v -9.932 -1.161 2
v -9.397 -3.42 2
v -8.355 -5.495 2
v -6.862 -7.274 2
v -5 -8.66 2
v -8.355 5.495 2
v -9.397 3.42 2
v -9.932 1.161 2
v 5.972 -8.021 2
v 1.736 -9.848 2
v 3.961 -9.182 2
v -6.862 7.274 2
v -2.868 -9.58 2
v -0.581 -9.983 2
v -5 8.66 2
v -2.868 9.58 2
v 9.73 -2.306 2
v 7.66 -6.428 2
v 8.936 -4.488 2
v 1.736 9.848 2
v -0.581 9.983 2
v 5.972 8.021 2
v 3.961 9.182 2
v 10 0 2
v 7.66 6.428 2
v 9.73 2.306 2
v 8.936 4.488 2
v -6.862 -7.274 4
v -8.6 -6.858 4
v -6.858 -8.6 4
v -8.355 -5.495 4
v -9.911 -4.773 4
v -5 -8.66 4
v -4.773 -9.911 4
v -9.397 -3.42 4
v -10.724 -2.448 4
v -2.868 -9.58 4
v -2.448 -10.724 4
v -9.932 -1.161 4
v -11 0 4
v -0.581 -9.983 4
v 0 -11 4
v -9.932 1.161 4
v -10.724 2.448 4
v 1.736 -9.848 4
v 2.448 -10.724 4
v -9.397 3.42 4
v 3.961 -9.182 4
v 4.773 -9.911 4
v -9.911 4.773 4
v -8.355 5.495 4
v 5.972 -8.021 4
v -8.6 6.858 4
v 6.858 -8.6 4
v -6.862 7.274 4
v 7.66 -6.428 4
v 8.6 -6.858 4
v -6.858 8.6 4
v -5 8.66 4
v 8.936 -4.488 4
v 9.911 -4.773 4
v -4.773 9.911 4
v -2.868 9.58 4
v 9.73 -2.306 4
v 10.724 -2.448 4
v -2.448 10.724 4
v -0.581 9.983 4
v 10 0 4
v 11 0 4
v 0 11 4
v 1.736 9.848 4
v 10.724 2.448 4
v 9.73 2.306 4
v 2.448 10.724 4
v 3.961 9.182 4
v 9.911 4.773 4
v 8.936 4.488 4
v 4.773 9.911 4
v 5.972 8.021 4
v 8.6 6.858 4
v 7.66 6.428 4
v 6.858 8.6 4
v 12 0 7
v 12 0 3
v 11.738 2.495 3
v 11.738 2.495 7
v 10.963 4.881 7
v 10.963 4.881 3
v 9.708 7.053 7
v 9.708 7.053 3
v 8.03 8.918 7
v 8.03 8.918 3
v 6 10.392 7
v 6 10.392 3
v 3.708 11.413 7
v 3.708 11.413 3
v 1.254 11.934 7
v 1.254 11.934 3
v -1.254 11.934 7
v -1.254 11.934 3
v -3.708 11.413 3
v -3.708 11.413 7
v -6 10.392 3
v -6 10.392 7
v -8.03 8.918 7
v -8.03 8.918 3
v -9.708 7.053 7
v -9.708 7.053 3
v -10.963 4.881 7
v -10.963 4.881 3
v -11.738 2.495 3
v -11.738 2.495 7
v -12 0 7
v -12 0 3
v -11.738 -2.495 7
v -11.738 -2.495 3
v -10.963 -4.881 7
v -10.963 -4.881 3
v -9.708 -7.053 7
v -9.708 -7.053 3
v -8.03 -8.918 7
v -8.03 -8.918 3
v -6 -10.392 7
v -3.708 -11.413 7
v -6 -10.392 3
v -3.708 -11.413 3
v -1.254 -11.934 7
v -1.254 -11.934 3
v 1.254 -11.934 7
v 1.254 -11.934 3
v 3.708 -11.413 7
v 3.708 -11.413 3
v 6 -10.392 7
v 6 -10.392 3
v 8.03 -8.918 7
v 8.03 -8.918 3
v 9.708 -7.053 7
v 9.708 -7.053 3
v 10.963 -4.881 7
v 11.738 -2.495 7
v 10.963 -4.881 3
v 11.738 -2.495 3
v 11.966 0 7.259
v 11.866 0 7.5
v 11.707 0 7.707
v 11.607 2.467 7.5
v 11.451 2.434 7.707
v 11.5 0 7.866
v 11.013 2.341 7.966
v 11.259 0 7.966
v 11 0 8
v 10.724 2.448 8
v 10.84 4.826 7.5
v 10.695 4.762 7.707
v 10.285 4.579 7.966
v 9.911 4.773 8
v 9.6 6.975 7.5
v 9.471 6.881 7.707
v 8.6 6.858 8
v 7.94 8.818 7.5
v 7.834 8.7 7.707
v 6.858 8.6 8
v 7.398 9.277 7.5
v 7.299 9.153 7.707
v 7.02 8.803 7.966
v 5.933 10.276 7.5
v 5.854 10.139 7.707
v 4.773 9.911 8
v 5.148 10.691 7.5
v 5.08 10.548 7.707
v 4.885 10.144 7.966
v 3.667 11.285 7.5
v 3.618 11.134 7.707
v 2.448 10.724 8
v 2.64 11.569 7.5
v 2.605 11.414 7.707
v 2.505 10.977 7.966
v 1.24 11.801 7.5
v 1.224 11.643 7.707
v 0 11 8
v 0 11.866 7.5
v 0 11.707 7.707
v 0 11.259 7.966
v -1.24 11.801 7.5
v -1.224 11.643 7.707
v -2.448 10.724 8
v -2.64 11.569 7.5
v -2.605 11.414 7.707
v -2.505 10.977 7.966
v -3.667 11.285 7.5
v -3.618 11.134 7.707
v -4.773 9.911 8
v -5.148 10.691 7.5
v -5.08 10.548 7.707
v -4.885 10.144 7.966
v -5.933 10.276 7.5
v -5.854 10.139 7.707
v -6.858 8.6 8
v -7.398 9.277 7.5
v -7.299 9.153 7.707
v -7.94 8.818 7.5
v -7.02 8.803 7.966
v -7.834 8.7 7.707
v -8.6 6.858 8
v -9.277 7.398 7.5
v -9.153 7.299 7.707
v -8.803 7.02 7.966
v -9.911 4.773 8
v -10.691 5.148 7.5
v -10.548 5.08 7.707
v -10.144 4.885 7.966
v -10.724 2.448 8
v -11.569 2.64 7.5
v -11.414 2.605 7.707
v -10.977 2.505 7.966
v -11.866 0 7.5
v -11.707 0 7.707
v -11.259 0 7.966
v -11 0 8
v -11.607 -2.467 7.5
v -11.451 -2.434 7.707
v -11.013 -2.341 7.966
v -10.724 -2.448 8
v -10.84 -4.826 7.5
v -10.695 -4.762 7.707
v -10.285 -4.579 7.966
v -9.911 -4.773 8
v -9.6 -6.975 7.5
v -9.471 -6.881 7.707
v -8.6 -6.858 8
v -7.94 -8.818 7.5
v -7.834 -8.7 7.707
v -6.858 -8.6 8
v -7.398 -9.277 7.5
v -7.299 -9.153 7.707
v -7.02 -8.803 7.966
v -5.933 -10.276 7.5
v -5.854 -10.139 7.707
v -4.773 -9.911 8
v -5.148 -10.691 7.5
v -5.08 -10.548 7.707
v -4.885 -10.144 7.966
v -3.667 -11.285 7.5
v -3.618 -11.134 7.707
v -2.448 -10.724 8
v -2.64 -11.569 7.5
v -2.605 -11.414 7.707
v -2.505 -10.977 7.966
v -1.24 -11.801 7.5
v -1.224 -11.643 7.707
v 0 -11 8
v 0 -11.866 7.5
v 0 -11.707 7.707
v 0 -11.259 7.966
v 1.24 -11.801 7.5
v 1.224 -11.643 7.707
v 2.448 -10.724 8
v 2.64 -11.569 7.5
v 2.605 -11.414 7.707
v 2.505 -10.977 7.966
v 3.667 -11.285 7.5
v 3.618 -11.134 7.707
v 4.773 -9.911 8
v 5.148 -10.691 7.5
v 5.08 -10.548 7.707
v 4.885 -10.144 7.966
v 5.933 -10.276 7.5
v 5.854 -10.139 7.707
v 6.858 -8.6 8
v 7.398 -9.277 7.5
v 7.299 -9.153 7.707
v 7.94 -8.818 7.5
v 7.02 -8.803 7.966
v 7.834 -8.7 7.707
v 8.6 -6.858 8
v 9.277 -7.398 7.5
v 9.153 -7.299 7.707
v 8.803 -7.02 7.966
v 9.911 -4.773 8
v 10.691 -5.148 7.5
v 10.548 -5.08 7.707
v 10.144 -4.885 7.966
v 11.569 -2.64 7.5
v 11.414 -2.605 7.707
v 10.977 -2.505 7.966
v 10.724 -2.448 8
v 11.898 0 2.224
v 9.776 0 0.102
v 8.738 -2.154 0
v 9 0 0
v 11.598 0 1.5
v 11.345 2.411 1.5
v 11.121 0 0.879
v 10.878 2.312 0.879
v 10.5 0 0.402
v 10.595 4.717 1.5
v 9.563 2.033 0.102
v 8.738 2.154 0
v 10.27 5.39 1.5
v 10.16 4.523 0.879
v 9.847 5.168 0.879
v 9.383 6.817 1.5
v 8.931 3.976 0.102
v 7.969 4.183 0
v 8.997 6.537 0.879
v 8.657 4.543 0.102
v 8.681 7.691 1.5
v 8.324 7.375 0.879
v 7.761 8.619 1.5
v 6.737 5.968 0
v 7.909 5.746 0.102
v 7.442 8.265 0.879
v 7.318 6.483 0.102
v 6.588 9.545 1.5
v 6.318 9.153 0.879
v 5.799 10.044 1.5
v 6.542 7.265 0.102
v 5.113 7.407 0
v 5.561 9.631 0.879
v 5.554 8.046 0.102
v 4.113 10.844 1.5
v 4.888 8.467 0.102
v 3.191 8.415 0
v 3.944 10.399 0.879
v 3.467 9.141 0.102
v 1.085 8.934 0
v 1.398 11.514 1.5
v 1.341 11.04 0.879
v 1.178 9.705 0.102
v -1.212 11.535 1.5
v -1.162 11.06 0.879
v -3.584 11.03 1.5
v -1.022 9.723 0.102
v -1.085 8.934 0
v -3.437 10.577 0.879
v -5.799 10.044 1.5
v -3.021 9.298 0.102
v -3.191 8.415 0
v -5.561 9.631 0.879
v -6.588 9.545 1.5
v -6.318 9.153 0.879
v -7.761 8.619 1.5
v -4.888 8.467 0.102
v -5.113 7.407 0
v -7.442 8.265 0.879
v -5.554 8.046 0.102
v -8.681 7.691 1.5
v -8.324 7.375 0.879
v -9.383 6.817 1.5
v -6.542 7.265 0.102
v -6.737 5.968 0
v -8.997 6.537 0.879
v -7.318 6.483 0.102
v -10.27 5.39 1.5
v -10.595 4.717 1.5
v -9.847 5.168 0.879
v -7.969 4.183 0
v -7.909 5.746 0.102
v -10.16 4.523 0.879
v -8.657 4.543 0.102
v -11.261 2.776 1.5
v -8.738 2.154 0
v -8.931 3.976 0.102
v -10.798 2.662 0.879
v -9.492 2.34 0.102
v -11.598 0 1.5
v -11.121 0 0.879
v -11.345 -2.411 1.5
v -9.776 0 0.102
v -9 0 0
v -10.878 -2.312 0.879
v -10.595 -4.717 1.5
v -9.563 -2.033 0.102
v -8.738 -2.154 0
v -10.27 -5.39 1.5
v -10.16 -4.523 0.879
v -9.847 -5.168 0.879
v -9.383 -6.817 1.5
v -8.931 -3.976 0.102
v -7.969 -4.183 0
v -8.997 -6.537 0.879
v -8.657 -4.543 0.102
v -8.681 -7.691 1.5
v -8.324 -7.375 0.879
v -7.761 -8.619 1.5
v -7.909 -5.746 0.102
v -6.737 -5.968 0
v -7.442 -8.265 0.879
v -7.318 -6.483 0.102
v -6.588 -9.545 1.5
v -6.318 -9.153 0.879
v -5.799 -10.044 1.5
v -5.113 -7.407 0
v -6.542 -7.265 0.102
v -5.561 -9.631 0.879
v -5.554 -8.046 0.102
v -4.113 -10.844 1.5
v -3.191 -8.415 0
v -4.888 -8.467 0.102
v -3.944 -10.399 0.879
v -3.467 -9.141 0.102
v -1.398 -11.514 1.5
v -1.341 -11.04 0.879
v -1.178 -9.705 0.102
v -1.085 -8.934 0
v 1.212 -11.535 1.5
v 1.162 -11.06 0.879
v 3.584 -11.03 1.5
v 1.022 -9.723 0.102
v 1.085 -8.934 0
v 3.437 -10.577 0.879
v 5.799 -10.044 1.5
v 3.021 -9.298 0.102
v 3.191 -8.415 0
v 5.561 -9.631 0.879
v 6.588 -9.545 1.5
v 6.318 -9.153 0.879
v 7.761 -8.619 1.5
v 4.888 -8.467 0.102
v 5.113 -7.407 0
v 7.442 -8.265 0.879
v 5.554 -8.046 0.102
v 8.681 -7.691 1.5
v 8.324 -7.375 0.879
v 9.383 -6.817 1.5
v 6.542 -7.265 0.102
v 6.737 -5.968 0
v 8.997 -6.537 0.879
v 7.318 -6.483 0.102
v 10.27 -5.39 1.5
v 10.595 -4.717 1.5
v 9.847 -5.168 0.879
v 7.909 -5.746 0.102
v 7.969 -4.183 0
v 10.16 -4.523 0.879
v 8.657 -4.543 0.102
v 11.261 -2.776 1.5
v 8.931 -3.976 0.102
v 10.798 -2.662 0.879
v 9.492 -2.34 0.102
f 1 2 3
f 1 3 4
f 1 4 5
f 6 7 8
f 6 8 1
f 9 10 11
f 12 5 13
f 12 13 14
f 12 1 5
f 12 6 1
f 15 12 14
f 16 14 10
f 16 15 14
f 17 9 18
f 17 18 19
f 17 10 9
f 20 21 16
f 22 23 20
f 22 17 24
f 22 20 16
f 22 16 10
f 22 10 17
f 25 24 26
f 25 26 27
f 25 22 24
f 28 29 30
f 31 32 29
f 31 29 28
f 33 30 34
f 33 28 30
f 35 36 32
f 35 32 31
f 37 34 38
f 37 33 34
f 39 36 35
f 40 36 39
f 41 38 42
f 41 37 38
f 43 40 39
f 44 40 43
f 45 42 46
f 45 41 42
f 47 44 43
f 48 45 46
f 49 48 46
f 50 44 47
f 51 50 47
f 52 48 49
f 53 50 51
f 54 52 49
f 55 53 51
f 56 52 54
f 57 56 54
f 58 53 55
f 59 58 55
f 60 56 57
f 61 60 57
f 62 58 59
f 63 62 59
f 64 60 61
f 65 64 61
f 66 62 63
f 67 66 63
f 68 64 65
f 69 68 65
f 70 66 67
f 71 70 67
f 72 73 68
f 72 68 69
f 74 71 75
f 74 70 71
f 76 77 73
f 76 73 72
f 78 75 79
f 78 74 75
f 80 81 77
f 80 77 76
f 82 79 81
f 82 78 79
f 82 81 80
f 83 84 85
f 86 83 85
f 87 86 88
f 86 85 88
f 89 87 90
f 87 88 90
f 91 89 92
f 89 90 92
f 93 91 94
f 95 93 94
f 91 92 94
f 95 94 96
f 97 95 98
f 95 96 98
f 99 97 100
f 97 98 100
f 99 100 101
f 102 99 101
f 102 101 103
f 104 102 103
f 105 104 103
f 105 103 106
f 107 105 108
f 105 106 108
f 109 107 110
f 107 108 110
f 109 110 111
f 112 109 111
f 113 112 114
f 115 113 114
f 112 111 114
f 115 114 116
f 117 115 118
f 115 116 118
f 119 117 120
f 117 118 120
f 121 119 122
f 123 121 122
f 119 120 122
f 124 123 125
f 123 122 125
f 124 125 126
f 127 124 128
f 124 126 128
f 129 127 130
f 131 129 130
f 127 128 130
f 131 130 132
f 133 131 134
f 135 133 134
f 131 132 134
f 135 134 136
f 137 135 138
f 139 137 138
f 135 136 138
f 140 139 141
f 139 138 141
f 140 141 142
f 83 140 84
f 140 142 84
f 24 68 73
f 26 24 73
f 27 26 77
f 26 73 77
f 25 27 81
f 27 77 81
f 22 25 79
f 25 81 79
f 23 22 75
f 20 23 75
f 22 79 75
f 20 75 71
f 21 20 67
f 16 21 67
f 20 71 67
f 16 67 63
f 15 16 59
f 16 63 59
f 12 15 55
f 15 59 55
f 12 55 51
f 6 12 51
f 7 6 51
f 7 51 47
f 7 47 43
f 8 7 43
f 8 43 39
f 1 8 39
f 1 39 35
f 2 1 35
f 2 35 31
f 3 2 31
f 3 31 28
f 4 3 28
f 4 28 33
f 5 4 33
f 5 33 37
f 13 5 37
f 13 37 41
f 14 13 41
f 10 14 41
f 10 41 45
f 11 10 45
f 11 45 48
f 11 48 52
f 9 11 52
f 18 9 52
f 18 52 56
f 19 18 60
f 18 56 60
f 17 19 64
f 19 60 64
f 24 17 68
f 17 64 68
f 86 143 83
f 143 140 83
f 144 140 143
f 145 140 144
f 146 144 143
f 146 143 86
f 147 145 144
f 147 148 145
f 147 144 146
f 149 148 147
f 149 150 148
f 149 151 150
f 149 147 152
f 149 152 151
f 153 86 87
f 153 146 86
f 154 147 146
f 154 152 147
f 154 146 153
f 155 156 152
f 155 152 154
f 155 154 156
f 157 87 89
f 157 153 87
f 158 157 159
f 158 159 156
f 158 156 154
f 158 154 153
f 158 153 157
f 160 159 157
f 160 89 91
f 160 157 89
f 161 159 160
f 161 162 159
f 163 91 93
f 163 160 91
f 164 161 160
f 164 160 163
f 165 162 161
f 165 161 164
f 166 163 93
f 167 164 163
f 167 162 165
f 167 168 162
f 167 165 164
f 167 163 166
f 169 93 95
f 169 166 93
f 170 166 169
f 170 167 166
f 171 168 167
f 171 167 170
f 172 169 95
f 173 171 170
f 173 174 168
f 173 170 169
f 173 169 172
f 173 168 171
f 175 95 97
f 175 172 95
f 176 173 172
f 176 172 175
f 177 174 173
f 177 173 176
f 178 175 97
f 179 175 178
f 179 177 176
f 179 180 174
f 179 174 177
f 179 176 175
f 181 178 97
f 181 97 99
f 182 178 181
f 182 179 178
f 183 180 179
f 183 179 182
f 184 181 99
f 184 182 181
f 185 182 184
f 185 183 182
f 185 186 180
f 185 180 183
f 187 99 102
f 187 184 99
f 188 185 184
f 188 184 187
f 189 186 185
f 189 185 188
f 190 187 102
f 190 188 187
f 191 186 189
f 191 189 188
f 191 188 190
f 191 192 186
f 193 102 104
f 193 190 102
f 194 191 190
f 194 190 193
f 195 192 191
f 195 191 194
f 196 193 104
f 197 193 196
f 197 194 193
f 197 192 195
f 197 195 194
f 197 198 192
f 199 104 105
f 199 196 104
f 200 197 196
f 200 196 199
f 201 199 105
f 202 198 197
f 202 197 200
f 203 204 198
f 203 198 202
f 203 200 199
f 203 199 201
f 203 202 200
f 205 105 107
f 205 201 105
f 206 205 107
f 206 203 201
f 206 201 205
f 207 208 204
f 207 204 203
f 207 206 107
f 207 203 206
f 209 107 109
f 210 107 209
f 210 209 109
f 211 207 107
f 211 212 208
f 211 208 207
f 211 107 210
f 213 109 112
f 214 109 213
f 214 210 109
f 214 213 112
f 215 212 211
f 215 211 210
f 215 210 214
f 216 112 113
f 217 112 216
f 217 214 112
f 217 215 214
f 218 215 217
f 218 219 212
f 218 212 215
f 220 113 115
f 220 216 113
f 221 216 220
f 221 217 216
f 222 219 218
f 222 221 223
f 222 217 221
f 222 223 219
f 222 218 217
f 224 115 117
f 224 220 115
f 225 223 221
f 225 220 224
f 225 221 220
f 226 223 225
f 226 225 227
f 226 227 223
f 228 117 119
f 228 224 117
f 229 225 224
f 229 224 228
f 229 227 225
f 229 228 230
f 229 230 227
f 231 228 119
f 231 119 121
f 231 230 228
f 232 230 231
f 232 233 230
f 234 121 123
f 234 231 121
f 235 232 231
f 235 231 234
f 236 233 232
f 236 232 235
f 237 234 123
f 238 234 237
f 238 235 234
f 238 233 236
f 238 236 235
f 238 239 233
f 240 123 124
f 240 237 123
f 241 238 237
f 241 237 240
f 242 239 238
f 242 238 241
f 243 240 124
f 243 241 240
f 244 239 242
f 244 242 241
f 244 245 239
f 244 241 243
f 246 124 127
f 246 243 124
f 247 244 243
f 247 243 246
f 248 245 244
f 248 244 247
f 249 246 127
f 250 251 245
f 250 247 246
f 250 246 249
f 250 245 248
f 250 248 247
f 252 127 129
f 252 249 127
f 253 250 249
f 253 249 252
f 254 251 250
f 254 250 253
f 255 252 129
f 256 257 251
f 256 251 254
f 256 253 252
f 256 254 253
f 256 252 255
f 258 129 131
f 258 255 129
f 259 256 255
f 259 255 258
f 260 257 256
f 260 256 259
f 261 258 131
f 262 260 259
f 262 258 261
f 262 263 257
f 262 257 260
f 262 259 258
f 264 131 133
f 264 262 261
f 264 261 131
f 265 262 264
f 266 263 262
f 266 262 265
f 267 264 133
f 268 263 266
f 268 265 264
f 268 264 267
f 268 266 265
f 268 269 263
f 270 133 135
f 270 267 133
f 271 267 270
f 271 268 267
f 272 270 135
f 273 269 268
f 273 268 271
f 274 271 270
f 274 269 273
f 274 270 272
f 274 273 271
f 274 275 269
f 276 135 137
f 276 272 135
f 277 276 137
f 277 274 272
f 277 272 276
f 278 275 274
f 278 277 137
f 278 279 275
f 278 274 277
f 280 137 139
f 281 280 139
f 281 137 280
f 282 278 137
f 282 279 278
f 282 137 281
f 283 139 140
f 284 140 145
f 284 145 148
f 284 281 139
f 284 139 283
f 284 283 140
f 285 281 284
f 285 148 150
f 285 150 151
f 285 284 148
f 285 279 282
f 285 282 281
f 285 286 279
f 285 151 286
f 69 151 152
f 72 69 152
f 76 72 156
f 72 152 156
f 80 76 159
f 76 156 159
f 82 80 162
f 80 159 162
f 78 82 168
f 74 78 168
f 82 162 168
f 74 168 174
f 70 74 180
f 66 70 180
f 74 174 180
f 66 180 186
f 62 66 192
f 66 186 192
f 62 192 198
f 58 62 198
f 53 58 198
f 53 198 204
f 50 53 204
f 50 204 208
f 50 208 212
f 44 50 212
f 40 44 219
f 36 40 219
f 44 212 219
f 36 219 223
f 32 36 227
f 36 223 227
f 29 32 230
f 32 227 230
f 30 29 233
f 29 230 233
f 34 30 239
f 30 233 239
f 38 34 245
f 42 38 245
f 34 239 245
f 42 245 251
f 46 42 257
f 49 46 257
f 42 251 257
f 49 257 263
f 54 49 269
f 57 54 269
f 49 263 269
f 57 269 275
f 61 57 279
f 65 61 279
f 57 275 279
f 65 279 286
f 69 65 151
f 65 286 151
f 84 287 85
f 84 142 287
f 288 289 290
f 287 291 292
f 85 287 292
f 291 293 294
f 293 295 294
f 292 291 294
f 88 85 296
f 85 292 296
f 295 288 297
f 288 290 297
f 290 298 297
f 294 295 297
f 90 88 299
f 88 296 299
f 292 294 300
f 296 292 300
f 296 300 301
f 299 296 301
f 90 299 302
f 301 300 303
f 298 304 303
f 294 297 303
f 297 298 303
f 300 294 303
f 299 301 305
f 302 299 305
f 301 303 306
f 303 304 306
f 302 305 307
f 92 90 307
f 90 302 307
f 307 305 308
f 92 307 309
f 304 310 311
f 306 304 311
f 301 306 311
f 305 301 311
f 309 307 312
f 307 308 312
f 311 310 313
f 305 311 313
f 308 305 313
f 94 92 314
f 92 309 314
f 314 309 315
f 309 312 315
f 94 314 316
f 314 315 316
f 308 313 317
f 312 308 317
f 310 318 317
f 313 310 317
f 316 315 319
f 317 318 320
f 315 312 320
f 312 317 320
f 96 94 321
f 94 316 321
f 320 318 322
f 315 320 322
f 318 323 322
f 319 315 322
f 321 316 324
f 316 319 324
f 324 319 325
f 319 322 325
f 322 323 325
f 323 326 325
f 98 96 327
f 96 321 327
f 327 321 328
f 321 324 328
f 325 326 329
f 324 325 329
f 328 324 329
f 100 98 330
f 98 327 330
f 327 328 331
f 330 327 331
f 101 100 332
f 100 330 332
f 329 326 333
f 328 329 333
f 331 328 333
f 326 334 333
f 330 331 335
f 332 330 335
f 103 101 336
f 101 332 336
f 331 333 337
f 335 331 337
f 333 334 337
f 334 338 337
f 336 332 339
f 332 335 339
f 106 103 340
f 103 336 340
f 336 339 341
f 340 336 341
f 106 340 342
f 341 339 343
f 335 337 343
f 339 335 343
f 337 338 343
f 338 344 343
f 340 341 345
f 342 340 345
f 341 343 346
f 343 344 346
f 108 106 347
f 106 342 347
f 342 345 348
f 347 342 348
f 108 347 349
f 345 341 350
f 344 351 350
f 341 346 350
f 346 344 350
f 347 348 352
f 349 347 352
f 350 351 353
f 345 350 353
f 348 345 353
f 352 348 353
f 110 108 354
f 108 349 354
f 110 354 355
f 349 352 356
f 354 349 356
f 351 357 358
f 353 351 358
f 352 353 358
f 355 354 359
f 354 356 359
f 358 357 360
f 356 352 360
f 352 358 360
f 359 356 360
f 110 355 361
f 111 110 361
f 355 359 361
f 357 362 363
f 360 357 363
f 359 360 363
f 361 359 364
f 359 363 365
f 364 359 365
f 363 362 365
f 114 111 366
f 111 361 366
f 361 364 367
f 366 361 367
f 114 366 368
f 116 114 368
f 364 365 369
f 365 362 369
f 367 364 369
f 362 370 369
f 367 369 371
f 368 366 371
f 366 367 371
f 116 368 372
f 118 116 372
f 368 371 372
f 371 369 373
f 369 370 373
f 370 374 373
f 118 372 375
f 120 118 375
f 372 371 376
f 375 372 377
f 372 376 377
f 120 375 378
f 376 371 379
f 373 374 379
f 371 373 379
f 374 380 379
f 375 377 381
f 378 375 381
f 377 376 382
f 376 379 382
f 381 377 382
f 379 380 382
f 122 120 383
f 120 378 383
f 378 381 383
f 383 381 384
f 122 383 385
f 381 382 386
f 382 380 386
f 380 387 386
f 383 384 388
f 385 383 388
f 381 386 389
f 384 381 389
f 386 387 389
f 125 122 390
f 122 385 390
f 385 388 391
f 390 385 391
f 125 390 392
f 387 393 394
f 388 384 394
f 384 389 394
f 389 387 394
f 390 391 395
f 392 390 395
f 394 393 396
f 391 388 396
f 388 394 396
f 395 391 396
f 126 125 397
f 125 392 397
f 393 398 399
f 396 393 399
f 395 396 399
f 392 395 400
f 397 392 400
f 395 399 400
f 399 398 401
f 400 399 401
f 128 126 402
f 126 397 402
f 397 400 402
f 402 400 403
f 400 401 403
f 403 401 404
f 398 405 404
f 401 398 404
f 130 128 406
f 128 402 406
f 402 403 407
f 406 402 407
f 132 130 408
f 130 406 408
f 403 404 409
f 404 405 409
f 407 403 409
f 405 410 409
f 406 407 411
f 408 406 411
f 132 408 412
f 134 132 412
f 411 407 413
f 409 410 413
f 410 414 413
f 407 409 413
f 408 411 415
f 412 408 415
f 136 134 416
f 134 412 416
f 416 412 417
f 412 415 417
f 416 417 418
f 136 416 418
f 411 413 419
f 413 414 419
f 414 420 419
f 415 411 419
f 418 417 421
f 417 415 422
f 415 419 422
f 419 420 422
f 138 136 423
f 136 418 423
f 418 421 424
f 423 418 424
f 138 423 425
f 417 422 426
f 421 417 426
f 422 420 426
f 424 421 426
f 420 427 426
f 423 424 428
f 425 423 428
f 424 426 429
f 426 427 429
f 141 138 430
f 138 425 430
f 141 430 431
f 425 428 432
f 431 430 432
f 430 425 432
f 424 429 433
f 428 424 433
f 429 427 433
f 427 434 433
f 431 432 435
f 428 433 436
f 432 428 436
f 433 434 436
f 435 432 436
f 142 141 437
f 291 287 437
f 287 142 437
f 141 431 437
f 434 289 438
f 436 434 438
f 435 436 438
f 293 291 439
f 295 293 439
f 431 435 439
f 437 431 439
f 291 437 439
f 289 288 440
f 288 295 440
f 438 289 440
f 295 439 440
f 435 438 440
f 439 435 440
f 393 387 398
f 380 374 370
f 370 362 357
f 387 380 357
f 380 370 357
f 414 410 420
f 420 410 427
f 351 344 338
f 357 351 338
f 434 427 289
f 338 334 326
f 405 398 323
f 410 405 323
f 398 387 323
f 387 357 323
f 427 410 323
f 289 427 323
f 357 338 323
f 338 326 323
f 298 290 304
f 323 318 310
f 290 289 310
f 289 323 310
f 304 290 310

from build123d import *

# Parameters (mm, degrees)
F0_R     = 12
F1_DEPTH = 8
F2_R     = 10
F3_DEPTH = 6
F2_R_2   = 11
F4_DEPTH = 4
F5_R     = 3
F6_R     = 0.99999


# Not quite as in the source:
# - a fillet or chamfer is up to 0.001 mm smaller than in the source, because OpenCascade refuses the exact size


with BuildPart() as f1:
    # F0 (on Top) → F1 (new body)
    with BuildSketch(Plane.XY):
        Circle(F0_R)
    extrude(amount=F1_DEPTH)

    # F2 (on face) → F3 (cut)
    with BuildSketch(Plane.XY.offset(8)):
        Circle(F2_R)
    extrude(amount=-F3_DEPTH, mode=Mode.SUBTRACT)

    # F2 (on face) → F4 (cut)
    with BuildSketch(Plane.XY.offset(8)):
        Circle(F2_R_2)
        Circle(F2_R, mode=Mode.SUBTRACT)
    extrude(amount=-F4_DEPTH, mode=Mode.SUBTRACT)

    # F5
    f5_edges = [f1.edges().sort_by_distance(p)[0] for p in [
        (-12, 0, 0),
    ]]
    fillet(f5_edges, radius=F5_R)

    # F6 (radius 1 in the source; OpenCascade refuses exactly that, so slightly less here)
    f6_edges = [f1.edges().sort_by_distance(p)[0] for p in [
        (-12, 0, 8),
    ]]
    fillet(f6_edges, radius=F6_R)


solid = f1.part
